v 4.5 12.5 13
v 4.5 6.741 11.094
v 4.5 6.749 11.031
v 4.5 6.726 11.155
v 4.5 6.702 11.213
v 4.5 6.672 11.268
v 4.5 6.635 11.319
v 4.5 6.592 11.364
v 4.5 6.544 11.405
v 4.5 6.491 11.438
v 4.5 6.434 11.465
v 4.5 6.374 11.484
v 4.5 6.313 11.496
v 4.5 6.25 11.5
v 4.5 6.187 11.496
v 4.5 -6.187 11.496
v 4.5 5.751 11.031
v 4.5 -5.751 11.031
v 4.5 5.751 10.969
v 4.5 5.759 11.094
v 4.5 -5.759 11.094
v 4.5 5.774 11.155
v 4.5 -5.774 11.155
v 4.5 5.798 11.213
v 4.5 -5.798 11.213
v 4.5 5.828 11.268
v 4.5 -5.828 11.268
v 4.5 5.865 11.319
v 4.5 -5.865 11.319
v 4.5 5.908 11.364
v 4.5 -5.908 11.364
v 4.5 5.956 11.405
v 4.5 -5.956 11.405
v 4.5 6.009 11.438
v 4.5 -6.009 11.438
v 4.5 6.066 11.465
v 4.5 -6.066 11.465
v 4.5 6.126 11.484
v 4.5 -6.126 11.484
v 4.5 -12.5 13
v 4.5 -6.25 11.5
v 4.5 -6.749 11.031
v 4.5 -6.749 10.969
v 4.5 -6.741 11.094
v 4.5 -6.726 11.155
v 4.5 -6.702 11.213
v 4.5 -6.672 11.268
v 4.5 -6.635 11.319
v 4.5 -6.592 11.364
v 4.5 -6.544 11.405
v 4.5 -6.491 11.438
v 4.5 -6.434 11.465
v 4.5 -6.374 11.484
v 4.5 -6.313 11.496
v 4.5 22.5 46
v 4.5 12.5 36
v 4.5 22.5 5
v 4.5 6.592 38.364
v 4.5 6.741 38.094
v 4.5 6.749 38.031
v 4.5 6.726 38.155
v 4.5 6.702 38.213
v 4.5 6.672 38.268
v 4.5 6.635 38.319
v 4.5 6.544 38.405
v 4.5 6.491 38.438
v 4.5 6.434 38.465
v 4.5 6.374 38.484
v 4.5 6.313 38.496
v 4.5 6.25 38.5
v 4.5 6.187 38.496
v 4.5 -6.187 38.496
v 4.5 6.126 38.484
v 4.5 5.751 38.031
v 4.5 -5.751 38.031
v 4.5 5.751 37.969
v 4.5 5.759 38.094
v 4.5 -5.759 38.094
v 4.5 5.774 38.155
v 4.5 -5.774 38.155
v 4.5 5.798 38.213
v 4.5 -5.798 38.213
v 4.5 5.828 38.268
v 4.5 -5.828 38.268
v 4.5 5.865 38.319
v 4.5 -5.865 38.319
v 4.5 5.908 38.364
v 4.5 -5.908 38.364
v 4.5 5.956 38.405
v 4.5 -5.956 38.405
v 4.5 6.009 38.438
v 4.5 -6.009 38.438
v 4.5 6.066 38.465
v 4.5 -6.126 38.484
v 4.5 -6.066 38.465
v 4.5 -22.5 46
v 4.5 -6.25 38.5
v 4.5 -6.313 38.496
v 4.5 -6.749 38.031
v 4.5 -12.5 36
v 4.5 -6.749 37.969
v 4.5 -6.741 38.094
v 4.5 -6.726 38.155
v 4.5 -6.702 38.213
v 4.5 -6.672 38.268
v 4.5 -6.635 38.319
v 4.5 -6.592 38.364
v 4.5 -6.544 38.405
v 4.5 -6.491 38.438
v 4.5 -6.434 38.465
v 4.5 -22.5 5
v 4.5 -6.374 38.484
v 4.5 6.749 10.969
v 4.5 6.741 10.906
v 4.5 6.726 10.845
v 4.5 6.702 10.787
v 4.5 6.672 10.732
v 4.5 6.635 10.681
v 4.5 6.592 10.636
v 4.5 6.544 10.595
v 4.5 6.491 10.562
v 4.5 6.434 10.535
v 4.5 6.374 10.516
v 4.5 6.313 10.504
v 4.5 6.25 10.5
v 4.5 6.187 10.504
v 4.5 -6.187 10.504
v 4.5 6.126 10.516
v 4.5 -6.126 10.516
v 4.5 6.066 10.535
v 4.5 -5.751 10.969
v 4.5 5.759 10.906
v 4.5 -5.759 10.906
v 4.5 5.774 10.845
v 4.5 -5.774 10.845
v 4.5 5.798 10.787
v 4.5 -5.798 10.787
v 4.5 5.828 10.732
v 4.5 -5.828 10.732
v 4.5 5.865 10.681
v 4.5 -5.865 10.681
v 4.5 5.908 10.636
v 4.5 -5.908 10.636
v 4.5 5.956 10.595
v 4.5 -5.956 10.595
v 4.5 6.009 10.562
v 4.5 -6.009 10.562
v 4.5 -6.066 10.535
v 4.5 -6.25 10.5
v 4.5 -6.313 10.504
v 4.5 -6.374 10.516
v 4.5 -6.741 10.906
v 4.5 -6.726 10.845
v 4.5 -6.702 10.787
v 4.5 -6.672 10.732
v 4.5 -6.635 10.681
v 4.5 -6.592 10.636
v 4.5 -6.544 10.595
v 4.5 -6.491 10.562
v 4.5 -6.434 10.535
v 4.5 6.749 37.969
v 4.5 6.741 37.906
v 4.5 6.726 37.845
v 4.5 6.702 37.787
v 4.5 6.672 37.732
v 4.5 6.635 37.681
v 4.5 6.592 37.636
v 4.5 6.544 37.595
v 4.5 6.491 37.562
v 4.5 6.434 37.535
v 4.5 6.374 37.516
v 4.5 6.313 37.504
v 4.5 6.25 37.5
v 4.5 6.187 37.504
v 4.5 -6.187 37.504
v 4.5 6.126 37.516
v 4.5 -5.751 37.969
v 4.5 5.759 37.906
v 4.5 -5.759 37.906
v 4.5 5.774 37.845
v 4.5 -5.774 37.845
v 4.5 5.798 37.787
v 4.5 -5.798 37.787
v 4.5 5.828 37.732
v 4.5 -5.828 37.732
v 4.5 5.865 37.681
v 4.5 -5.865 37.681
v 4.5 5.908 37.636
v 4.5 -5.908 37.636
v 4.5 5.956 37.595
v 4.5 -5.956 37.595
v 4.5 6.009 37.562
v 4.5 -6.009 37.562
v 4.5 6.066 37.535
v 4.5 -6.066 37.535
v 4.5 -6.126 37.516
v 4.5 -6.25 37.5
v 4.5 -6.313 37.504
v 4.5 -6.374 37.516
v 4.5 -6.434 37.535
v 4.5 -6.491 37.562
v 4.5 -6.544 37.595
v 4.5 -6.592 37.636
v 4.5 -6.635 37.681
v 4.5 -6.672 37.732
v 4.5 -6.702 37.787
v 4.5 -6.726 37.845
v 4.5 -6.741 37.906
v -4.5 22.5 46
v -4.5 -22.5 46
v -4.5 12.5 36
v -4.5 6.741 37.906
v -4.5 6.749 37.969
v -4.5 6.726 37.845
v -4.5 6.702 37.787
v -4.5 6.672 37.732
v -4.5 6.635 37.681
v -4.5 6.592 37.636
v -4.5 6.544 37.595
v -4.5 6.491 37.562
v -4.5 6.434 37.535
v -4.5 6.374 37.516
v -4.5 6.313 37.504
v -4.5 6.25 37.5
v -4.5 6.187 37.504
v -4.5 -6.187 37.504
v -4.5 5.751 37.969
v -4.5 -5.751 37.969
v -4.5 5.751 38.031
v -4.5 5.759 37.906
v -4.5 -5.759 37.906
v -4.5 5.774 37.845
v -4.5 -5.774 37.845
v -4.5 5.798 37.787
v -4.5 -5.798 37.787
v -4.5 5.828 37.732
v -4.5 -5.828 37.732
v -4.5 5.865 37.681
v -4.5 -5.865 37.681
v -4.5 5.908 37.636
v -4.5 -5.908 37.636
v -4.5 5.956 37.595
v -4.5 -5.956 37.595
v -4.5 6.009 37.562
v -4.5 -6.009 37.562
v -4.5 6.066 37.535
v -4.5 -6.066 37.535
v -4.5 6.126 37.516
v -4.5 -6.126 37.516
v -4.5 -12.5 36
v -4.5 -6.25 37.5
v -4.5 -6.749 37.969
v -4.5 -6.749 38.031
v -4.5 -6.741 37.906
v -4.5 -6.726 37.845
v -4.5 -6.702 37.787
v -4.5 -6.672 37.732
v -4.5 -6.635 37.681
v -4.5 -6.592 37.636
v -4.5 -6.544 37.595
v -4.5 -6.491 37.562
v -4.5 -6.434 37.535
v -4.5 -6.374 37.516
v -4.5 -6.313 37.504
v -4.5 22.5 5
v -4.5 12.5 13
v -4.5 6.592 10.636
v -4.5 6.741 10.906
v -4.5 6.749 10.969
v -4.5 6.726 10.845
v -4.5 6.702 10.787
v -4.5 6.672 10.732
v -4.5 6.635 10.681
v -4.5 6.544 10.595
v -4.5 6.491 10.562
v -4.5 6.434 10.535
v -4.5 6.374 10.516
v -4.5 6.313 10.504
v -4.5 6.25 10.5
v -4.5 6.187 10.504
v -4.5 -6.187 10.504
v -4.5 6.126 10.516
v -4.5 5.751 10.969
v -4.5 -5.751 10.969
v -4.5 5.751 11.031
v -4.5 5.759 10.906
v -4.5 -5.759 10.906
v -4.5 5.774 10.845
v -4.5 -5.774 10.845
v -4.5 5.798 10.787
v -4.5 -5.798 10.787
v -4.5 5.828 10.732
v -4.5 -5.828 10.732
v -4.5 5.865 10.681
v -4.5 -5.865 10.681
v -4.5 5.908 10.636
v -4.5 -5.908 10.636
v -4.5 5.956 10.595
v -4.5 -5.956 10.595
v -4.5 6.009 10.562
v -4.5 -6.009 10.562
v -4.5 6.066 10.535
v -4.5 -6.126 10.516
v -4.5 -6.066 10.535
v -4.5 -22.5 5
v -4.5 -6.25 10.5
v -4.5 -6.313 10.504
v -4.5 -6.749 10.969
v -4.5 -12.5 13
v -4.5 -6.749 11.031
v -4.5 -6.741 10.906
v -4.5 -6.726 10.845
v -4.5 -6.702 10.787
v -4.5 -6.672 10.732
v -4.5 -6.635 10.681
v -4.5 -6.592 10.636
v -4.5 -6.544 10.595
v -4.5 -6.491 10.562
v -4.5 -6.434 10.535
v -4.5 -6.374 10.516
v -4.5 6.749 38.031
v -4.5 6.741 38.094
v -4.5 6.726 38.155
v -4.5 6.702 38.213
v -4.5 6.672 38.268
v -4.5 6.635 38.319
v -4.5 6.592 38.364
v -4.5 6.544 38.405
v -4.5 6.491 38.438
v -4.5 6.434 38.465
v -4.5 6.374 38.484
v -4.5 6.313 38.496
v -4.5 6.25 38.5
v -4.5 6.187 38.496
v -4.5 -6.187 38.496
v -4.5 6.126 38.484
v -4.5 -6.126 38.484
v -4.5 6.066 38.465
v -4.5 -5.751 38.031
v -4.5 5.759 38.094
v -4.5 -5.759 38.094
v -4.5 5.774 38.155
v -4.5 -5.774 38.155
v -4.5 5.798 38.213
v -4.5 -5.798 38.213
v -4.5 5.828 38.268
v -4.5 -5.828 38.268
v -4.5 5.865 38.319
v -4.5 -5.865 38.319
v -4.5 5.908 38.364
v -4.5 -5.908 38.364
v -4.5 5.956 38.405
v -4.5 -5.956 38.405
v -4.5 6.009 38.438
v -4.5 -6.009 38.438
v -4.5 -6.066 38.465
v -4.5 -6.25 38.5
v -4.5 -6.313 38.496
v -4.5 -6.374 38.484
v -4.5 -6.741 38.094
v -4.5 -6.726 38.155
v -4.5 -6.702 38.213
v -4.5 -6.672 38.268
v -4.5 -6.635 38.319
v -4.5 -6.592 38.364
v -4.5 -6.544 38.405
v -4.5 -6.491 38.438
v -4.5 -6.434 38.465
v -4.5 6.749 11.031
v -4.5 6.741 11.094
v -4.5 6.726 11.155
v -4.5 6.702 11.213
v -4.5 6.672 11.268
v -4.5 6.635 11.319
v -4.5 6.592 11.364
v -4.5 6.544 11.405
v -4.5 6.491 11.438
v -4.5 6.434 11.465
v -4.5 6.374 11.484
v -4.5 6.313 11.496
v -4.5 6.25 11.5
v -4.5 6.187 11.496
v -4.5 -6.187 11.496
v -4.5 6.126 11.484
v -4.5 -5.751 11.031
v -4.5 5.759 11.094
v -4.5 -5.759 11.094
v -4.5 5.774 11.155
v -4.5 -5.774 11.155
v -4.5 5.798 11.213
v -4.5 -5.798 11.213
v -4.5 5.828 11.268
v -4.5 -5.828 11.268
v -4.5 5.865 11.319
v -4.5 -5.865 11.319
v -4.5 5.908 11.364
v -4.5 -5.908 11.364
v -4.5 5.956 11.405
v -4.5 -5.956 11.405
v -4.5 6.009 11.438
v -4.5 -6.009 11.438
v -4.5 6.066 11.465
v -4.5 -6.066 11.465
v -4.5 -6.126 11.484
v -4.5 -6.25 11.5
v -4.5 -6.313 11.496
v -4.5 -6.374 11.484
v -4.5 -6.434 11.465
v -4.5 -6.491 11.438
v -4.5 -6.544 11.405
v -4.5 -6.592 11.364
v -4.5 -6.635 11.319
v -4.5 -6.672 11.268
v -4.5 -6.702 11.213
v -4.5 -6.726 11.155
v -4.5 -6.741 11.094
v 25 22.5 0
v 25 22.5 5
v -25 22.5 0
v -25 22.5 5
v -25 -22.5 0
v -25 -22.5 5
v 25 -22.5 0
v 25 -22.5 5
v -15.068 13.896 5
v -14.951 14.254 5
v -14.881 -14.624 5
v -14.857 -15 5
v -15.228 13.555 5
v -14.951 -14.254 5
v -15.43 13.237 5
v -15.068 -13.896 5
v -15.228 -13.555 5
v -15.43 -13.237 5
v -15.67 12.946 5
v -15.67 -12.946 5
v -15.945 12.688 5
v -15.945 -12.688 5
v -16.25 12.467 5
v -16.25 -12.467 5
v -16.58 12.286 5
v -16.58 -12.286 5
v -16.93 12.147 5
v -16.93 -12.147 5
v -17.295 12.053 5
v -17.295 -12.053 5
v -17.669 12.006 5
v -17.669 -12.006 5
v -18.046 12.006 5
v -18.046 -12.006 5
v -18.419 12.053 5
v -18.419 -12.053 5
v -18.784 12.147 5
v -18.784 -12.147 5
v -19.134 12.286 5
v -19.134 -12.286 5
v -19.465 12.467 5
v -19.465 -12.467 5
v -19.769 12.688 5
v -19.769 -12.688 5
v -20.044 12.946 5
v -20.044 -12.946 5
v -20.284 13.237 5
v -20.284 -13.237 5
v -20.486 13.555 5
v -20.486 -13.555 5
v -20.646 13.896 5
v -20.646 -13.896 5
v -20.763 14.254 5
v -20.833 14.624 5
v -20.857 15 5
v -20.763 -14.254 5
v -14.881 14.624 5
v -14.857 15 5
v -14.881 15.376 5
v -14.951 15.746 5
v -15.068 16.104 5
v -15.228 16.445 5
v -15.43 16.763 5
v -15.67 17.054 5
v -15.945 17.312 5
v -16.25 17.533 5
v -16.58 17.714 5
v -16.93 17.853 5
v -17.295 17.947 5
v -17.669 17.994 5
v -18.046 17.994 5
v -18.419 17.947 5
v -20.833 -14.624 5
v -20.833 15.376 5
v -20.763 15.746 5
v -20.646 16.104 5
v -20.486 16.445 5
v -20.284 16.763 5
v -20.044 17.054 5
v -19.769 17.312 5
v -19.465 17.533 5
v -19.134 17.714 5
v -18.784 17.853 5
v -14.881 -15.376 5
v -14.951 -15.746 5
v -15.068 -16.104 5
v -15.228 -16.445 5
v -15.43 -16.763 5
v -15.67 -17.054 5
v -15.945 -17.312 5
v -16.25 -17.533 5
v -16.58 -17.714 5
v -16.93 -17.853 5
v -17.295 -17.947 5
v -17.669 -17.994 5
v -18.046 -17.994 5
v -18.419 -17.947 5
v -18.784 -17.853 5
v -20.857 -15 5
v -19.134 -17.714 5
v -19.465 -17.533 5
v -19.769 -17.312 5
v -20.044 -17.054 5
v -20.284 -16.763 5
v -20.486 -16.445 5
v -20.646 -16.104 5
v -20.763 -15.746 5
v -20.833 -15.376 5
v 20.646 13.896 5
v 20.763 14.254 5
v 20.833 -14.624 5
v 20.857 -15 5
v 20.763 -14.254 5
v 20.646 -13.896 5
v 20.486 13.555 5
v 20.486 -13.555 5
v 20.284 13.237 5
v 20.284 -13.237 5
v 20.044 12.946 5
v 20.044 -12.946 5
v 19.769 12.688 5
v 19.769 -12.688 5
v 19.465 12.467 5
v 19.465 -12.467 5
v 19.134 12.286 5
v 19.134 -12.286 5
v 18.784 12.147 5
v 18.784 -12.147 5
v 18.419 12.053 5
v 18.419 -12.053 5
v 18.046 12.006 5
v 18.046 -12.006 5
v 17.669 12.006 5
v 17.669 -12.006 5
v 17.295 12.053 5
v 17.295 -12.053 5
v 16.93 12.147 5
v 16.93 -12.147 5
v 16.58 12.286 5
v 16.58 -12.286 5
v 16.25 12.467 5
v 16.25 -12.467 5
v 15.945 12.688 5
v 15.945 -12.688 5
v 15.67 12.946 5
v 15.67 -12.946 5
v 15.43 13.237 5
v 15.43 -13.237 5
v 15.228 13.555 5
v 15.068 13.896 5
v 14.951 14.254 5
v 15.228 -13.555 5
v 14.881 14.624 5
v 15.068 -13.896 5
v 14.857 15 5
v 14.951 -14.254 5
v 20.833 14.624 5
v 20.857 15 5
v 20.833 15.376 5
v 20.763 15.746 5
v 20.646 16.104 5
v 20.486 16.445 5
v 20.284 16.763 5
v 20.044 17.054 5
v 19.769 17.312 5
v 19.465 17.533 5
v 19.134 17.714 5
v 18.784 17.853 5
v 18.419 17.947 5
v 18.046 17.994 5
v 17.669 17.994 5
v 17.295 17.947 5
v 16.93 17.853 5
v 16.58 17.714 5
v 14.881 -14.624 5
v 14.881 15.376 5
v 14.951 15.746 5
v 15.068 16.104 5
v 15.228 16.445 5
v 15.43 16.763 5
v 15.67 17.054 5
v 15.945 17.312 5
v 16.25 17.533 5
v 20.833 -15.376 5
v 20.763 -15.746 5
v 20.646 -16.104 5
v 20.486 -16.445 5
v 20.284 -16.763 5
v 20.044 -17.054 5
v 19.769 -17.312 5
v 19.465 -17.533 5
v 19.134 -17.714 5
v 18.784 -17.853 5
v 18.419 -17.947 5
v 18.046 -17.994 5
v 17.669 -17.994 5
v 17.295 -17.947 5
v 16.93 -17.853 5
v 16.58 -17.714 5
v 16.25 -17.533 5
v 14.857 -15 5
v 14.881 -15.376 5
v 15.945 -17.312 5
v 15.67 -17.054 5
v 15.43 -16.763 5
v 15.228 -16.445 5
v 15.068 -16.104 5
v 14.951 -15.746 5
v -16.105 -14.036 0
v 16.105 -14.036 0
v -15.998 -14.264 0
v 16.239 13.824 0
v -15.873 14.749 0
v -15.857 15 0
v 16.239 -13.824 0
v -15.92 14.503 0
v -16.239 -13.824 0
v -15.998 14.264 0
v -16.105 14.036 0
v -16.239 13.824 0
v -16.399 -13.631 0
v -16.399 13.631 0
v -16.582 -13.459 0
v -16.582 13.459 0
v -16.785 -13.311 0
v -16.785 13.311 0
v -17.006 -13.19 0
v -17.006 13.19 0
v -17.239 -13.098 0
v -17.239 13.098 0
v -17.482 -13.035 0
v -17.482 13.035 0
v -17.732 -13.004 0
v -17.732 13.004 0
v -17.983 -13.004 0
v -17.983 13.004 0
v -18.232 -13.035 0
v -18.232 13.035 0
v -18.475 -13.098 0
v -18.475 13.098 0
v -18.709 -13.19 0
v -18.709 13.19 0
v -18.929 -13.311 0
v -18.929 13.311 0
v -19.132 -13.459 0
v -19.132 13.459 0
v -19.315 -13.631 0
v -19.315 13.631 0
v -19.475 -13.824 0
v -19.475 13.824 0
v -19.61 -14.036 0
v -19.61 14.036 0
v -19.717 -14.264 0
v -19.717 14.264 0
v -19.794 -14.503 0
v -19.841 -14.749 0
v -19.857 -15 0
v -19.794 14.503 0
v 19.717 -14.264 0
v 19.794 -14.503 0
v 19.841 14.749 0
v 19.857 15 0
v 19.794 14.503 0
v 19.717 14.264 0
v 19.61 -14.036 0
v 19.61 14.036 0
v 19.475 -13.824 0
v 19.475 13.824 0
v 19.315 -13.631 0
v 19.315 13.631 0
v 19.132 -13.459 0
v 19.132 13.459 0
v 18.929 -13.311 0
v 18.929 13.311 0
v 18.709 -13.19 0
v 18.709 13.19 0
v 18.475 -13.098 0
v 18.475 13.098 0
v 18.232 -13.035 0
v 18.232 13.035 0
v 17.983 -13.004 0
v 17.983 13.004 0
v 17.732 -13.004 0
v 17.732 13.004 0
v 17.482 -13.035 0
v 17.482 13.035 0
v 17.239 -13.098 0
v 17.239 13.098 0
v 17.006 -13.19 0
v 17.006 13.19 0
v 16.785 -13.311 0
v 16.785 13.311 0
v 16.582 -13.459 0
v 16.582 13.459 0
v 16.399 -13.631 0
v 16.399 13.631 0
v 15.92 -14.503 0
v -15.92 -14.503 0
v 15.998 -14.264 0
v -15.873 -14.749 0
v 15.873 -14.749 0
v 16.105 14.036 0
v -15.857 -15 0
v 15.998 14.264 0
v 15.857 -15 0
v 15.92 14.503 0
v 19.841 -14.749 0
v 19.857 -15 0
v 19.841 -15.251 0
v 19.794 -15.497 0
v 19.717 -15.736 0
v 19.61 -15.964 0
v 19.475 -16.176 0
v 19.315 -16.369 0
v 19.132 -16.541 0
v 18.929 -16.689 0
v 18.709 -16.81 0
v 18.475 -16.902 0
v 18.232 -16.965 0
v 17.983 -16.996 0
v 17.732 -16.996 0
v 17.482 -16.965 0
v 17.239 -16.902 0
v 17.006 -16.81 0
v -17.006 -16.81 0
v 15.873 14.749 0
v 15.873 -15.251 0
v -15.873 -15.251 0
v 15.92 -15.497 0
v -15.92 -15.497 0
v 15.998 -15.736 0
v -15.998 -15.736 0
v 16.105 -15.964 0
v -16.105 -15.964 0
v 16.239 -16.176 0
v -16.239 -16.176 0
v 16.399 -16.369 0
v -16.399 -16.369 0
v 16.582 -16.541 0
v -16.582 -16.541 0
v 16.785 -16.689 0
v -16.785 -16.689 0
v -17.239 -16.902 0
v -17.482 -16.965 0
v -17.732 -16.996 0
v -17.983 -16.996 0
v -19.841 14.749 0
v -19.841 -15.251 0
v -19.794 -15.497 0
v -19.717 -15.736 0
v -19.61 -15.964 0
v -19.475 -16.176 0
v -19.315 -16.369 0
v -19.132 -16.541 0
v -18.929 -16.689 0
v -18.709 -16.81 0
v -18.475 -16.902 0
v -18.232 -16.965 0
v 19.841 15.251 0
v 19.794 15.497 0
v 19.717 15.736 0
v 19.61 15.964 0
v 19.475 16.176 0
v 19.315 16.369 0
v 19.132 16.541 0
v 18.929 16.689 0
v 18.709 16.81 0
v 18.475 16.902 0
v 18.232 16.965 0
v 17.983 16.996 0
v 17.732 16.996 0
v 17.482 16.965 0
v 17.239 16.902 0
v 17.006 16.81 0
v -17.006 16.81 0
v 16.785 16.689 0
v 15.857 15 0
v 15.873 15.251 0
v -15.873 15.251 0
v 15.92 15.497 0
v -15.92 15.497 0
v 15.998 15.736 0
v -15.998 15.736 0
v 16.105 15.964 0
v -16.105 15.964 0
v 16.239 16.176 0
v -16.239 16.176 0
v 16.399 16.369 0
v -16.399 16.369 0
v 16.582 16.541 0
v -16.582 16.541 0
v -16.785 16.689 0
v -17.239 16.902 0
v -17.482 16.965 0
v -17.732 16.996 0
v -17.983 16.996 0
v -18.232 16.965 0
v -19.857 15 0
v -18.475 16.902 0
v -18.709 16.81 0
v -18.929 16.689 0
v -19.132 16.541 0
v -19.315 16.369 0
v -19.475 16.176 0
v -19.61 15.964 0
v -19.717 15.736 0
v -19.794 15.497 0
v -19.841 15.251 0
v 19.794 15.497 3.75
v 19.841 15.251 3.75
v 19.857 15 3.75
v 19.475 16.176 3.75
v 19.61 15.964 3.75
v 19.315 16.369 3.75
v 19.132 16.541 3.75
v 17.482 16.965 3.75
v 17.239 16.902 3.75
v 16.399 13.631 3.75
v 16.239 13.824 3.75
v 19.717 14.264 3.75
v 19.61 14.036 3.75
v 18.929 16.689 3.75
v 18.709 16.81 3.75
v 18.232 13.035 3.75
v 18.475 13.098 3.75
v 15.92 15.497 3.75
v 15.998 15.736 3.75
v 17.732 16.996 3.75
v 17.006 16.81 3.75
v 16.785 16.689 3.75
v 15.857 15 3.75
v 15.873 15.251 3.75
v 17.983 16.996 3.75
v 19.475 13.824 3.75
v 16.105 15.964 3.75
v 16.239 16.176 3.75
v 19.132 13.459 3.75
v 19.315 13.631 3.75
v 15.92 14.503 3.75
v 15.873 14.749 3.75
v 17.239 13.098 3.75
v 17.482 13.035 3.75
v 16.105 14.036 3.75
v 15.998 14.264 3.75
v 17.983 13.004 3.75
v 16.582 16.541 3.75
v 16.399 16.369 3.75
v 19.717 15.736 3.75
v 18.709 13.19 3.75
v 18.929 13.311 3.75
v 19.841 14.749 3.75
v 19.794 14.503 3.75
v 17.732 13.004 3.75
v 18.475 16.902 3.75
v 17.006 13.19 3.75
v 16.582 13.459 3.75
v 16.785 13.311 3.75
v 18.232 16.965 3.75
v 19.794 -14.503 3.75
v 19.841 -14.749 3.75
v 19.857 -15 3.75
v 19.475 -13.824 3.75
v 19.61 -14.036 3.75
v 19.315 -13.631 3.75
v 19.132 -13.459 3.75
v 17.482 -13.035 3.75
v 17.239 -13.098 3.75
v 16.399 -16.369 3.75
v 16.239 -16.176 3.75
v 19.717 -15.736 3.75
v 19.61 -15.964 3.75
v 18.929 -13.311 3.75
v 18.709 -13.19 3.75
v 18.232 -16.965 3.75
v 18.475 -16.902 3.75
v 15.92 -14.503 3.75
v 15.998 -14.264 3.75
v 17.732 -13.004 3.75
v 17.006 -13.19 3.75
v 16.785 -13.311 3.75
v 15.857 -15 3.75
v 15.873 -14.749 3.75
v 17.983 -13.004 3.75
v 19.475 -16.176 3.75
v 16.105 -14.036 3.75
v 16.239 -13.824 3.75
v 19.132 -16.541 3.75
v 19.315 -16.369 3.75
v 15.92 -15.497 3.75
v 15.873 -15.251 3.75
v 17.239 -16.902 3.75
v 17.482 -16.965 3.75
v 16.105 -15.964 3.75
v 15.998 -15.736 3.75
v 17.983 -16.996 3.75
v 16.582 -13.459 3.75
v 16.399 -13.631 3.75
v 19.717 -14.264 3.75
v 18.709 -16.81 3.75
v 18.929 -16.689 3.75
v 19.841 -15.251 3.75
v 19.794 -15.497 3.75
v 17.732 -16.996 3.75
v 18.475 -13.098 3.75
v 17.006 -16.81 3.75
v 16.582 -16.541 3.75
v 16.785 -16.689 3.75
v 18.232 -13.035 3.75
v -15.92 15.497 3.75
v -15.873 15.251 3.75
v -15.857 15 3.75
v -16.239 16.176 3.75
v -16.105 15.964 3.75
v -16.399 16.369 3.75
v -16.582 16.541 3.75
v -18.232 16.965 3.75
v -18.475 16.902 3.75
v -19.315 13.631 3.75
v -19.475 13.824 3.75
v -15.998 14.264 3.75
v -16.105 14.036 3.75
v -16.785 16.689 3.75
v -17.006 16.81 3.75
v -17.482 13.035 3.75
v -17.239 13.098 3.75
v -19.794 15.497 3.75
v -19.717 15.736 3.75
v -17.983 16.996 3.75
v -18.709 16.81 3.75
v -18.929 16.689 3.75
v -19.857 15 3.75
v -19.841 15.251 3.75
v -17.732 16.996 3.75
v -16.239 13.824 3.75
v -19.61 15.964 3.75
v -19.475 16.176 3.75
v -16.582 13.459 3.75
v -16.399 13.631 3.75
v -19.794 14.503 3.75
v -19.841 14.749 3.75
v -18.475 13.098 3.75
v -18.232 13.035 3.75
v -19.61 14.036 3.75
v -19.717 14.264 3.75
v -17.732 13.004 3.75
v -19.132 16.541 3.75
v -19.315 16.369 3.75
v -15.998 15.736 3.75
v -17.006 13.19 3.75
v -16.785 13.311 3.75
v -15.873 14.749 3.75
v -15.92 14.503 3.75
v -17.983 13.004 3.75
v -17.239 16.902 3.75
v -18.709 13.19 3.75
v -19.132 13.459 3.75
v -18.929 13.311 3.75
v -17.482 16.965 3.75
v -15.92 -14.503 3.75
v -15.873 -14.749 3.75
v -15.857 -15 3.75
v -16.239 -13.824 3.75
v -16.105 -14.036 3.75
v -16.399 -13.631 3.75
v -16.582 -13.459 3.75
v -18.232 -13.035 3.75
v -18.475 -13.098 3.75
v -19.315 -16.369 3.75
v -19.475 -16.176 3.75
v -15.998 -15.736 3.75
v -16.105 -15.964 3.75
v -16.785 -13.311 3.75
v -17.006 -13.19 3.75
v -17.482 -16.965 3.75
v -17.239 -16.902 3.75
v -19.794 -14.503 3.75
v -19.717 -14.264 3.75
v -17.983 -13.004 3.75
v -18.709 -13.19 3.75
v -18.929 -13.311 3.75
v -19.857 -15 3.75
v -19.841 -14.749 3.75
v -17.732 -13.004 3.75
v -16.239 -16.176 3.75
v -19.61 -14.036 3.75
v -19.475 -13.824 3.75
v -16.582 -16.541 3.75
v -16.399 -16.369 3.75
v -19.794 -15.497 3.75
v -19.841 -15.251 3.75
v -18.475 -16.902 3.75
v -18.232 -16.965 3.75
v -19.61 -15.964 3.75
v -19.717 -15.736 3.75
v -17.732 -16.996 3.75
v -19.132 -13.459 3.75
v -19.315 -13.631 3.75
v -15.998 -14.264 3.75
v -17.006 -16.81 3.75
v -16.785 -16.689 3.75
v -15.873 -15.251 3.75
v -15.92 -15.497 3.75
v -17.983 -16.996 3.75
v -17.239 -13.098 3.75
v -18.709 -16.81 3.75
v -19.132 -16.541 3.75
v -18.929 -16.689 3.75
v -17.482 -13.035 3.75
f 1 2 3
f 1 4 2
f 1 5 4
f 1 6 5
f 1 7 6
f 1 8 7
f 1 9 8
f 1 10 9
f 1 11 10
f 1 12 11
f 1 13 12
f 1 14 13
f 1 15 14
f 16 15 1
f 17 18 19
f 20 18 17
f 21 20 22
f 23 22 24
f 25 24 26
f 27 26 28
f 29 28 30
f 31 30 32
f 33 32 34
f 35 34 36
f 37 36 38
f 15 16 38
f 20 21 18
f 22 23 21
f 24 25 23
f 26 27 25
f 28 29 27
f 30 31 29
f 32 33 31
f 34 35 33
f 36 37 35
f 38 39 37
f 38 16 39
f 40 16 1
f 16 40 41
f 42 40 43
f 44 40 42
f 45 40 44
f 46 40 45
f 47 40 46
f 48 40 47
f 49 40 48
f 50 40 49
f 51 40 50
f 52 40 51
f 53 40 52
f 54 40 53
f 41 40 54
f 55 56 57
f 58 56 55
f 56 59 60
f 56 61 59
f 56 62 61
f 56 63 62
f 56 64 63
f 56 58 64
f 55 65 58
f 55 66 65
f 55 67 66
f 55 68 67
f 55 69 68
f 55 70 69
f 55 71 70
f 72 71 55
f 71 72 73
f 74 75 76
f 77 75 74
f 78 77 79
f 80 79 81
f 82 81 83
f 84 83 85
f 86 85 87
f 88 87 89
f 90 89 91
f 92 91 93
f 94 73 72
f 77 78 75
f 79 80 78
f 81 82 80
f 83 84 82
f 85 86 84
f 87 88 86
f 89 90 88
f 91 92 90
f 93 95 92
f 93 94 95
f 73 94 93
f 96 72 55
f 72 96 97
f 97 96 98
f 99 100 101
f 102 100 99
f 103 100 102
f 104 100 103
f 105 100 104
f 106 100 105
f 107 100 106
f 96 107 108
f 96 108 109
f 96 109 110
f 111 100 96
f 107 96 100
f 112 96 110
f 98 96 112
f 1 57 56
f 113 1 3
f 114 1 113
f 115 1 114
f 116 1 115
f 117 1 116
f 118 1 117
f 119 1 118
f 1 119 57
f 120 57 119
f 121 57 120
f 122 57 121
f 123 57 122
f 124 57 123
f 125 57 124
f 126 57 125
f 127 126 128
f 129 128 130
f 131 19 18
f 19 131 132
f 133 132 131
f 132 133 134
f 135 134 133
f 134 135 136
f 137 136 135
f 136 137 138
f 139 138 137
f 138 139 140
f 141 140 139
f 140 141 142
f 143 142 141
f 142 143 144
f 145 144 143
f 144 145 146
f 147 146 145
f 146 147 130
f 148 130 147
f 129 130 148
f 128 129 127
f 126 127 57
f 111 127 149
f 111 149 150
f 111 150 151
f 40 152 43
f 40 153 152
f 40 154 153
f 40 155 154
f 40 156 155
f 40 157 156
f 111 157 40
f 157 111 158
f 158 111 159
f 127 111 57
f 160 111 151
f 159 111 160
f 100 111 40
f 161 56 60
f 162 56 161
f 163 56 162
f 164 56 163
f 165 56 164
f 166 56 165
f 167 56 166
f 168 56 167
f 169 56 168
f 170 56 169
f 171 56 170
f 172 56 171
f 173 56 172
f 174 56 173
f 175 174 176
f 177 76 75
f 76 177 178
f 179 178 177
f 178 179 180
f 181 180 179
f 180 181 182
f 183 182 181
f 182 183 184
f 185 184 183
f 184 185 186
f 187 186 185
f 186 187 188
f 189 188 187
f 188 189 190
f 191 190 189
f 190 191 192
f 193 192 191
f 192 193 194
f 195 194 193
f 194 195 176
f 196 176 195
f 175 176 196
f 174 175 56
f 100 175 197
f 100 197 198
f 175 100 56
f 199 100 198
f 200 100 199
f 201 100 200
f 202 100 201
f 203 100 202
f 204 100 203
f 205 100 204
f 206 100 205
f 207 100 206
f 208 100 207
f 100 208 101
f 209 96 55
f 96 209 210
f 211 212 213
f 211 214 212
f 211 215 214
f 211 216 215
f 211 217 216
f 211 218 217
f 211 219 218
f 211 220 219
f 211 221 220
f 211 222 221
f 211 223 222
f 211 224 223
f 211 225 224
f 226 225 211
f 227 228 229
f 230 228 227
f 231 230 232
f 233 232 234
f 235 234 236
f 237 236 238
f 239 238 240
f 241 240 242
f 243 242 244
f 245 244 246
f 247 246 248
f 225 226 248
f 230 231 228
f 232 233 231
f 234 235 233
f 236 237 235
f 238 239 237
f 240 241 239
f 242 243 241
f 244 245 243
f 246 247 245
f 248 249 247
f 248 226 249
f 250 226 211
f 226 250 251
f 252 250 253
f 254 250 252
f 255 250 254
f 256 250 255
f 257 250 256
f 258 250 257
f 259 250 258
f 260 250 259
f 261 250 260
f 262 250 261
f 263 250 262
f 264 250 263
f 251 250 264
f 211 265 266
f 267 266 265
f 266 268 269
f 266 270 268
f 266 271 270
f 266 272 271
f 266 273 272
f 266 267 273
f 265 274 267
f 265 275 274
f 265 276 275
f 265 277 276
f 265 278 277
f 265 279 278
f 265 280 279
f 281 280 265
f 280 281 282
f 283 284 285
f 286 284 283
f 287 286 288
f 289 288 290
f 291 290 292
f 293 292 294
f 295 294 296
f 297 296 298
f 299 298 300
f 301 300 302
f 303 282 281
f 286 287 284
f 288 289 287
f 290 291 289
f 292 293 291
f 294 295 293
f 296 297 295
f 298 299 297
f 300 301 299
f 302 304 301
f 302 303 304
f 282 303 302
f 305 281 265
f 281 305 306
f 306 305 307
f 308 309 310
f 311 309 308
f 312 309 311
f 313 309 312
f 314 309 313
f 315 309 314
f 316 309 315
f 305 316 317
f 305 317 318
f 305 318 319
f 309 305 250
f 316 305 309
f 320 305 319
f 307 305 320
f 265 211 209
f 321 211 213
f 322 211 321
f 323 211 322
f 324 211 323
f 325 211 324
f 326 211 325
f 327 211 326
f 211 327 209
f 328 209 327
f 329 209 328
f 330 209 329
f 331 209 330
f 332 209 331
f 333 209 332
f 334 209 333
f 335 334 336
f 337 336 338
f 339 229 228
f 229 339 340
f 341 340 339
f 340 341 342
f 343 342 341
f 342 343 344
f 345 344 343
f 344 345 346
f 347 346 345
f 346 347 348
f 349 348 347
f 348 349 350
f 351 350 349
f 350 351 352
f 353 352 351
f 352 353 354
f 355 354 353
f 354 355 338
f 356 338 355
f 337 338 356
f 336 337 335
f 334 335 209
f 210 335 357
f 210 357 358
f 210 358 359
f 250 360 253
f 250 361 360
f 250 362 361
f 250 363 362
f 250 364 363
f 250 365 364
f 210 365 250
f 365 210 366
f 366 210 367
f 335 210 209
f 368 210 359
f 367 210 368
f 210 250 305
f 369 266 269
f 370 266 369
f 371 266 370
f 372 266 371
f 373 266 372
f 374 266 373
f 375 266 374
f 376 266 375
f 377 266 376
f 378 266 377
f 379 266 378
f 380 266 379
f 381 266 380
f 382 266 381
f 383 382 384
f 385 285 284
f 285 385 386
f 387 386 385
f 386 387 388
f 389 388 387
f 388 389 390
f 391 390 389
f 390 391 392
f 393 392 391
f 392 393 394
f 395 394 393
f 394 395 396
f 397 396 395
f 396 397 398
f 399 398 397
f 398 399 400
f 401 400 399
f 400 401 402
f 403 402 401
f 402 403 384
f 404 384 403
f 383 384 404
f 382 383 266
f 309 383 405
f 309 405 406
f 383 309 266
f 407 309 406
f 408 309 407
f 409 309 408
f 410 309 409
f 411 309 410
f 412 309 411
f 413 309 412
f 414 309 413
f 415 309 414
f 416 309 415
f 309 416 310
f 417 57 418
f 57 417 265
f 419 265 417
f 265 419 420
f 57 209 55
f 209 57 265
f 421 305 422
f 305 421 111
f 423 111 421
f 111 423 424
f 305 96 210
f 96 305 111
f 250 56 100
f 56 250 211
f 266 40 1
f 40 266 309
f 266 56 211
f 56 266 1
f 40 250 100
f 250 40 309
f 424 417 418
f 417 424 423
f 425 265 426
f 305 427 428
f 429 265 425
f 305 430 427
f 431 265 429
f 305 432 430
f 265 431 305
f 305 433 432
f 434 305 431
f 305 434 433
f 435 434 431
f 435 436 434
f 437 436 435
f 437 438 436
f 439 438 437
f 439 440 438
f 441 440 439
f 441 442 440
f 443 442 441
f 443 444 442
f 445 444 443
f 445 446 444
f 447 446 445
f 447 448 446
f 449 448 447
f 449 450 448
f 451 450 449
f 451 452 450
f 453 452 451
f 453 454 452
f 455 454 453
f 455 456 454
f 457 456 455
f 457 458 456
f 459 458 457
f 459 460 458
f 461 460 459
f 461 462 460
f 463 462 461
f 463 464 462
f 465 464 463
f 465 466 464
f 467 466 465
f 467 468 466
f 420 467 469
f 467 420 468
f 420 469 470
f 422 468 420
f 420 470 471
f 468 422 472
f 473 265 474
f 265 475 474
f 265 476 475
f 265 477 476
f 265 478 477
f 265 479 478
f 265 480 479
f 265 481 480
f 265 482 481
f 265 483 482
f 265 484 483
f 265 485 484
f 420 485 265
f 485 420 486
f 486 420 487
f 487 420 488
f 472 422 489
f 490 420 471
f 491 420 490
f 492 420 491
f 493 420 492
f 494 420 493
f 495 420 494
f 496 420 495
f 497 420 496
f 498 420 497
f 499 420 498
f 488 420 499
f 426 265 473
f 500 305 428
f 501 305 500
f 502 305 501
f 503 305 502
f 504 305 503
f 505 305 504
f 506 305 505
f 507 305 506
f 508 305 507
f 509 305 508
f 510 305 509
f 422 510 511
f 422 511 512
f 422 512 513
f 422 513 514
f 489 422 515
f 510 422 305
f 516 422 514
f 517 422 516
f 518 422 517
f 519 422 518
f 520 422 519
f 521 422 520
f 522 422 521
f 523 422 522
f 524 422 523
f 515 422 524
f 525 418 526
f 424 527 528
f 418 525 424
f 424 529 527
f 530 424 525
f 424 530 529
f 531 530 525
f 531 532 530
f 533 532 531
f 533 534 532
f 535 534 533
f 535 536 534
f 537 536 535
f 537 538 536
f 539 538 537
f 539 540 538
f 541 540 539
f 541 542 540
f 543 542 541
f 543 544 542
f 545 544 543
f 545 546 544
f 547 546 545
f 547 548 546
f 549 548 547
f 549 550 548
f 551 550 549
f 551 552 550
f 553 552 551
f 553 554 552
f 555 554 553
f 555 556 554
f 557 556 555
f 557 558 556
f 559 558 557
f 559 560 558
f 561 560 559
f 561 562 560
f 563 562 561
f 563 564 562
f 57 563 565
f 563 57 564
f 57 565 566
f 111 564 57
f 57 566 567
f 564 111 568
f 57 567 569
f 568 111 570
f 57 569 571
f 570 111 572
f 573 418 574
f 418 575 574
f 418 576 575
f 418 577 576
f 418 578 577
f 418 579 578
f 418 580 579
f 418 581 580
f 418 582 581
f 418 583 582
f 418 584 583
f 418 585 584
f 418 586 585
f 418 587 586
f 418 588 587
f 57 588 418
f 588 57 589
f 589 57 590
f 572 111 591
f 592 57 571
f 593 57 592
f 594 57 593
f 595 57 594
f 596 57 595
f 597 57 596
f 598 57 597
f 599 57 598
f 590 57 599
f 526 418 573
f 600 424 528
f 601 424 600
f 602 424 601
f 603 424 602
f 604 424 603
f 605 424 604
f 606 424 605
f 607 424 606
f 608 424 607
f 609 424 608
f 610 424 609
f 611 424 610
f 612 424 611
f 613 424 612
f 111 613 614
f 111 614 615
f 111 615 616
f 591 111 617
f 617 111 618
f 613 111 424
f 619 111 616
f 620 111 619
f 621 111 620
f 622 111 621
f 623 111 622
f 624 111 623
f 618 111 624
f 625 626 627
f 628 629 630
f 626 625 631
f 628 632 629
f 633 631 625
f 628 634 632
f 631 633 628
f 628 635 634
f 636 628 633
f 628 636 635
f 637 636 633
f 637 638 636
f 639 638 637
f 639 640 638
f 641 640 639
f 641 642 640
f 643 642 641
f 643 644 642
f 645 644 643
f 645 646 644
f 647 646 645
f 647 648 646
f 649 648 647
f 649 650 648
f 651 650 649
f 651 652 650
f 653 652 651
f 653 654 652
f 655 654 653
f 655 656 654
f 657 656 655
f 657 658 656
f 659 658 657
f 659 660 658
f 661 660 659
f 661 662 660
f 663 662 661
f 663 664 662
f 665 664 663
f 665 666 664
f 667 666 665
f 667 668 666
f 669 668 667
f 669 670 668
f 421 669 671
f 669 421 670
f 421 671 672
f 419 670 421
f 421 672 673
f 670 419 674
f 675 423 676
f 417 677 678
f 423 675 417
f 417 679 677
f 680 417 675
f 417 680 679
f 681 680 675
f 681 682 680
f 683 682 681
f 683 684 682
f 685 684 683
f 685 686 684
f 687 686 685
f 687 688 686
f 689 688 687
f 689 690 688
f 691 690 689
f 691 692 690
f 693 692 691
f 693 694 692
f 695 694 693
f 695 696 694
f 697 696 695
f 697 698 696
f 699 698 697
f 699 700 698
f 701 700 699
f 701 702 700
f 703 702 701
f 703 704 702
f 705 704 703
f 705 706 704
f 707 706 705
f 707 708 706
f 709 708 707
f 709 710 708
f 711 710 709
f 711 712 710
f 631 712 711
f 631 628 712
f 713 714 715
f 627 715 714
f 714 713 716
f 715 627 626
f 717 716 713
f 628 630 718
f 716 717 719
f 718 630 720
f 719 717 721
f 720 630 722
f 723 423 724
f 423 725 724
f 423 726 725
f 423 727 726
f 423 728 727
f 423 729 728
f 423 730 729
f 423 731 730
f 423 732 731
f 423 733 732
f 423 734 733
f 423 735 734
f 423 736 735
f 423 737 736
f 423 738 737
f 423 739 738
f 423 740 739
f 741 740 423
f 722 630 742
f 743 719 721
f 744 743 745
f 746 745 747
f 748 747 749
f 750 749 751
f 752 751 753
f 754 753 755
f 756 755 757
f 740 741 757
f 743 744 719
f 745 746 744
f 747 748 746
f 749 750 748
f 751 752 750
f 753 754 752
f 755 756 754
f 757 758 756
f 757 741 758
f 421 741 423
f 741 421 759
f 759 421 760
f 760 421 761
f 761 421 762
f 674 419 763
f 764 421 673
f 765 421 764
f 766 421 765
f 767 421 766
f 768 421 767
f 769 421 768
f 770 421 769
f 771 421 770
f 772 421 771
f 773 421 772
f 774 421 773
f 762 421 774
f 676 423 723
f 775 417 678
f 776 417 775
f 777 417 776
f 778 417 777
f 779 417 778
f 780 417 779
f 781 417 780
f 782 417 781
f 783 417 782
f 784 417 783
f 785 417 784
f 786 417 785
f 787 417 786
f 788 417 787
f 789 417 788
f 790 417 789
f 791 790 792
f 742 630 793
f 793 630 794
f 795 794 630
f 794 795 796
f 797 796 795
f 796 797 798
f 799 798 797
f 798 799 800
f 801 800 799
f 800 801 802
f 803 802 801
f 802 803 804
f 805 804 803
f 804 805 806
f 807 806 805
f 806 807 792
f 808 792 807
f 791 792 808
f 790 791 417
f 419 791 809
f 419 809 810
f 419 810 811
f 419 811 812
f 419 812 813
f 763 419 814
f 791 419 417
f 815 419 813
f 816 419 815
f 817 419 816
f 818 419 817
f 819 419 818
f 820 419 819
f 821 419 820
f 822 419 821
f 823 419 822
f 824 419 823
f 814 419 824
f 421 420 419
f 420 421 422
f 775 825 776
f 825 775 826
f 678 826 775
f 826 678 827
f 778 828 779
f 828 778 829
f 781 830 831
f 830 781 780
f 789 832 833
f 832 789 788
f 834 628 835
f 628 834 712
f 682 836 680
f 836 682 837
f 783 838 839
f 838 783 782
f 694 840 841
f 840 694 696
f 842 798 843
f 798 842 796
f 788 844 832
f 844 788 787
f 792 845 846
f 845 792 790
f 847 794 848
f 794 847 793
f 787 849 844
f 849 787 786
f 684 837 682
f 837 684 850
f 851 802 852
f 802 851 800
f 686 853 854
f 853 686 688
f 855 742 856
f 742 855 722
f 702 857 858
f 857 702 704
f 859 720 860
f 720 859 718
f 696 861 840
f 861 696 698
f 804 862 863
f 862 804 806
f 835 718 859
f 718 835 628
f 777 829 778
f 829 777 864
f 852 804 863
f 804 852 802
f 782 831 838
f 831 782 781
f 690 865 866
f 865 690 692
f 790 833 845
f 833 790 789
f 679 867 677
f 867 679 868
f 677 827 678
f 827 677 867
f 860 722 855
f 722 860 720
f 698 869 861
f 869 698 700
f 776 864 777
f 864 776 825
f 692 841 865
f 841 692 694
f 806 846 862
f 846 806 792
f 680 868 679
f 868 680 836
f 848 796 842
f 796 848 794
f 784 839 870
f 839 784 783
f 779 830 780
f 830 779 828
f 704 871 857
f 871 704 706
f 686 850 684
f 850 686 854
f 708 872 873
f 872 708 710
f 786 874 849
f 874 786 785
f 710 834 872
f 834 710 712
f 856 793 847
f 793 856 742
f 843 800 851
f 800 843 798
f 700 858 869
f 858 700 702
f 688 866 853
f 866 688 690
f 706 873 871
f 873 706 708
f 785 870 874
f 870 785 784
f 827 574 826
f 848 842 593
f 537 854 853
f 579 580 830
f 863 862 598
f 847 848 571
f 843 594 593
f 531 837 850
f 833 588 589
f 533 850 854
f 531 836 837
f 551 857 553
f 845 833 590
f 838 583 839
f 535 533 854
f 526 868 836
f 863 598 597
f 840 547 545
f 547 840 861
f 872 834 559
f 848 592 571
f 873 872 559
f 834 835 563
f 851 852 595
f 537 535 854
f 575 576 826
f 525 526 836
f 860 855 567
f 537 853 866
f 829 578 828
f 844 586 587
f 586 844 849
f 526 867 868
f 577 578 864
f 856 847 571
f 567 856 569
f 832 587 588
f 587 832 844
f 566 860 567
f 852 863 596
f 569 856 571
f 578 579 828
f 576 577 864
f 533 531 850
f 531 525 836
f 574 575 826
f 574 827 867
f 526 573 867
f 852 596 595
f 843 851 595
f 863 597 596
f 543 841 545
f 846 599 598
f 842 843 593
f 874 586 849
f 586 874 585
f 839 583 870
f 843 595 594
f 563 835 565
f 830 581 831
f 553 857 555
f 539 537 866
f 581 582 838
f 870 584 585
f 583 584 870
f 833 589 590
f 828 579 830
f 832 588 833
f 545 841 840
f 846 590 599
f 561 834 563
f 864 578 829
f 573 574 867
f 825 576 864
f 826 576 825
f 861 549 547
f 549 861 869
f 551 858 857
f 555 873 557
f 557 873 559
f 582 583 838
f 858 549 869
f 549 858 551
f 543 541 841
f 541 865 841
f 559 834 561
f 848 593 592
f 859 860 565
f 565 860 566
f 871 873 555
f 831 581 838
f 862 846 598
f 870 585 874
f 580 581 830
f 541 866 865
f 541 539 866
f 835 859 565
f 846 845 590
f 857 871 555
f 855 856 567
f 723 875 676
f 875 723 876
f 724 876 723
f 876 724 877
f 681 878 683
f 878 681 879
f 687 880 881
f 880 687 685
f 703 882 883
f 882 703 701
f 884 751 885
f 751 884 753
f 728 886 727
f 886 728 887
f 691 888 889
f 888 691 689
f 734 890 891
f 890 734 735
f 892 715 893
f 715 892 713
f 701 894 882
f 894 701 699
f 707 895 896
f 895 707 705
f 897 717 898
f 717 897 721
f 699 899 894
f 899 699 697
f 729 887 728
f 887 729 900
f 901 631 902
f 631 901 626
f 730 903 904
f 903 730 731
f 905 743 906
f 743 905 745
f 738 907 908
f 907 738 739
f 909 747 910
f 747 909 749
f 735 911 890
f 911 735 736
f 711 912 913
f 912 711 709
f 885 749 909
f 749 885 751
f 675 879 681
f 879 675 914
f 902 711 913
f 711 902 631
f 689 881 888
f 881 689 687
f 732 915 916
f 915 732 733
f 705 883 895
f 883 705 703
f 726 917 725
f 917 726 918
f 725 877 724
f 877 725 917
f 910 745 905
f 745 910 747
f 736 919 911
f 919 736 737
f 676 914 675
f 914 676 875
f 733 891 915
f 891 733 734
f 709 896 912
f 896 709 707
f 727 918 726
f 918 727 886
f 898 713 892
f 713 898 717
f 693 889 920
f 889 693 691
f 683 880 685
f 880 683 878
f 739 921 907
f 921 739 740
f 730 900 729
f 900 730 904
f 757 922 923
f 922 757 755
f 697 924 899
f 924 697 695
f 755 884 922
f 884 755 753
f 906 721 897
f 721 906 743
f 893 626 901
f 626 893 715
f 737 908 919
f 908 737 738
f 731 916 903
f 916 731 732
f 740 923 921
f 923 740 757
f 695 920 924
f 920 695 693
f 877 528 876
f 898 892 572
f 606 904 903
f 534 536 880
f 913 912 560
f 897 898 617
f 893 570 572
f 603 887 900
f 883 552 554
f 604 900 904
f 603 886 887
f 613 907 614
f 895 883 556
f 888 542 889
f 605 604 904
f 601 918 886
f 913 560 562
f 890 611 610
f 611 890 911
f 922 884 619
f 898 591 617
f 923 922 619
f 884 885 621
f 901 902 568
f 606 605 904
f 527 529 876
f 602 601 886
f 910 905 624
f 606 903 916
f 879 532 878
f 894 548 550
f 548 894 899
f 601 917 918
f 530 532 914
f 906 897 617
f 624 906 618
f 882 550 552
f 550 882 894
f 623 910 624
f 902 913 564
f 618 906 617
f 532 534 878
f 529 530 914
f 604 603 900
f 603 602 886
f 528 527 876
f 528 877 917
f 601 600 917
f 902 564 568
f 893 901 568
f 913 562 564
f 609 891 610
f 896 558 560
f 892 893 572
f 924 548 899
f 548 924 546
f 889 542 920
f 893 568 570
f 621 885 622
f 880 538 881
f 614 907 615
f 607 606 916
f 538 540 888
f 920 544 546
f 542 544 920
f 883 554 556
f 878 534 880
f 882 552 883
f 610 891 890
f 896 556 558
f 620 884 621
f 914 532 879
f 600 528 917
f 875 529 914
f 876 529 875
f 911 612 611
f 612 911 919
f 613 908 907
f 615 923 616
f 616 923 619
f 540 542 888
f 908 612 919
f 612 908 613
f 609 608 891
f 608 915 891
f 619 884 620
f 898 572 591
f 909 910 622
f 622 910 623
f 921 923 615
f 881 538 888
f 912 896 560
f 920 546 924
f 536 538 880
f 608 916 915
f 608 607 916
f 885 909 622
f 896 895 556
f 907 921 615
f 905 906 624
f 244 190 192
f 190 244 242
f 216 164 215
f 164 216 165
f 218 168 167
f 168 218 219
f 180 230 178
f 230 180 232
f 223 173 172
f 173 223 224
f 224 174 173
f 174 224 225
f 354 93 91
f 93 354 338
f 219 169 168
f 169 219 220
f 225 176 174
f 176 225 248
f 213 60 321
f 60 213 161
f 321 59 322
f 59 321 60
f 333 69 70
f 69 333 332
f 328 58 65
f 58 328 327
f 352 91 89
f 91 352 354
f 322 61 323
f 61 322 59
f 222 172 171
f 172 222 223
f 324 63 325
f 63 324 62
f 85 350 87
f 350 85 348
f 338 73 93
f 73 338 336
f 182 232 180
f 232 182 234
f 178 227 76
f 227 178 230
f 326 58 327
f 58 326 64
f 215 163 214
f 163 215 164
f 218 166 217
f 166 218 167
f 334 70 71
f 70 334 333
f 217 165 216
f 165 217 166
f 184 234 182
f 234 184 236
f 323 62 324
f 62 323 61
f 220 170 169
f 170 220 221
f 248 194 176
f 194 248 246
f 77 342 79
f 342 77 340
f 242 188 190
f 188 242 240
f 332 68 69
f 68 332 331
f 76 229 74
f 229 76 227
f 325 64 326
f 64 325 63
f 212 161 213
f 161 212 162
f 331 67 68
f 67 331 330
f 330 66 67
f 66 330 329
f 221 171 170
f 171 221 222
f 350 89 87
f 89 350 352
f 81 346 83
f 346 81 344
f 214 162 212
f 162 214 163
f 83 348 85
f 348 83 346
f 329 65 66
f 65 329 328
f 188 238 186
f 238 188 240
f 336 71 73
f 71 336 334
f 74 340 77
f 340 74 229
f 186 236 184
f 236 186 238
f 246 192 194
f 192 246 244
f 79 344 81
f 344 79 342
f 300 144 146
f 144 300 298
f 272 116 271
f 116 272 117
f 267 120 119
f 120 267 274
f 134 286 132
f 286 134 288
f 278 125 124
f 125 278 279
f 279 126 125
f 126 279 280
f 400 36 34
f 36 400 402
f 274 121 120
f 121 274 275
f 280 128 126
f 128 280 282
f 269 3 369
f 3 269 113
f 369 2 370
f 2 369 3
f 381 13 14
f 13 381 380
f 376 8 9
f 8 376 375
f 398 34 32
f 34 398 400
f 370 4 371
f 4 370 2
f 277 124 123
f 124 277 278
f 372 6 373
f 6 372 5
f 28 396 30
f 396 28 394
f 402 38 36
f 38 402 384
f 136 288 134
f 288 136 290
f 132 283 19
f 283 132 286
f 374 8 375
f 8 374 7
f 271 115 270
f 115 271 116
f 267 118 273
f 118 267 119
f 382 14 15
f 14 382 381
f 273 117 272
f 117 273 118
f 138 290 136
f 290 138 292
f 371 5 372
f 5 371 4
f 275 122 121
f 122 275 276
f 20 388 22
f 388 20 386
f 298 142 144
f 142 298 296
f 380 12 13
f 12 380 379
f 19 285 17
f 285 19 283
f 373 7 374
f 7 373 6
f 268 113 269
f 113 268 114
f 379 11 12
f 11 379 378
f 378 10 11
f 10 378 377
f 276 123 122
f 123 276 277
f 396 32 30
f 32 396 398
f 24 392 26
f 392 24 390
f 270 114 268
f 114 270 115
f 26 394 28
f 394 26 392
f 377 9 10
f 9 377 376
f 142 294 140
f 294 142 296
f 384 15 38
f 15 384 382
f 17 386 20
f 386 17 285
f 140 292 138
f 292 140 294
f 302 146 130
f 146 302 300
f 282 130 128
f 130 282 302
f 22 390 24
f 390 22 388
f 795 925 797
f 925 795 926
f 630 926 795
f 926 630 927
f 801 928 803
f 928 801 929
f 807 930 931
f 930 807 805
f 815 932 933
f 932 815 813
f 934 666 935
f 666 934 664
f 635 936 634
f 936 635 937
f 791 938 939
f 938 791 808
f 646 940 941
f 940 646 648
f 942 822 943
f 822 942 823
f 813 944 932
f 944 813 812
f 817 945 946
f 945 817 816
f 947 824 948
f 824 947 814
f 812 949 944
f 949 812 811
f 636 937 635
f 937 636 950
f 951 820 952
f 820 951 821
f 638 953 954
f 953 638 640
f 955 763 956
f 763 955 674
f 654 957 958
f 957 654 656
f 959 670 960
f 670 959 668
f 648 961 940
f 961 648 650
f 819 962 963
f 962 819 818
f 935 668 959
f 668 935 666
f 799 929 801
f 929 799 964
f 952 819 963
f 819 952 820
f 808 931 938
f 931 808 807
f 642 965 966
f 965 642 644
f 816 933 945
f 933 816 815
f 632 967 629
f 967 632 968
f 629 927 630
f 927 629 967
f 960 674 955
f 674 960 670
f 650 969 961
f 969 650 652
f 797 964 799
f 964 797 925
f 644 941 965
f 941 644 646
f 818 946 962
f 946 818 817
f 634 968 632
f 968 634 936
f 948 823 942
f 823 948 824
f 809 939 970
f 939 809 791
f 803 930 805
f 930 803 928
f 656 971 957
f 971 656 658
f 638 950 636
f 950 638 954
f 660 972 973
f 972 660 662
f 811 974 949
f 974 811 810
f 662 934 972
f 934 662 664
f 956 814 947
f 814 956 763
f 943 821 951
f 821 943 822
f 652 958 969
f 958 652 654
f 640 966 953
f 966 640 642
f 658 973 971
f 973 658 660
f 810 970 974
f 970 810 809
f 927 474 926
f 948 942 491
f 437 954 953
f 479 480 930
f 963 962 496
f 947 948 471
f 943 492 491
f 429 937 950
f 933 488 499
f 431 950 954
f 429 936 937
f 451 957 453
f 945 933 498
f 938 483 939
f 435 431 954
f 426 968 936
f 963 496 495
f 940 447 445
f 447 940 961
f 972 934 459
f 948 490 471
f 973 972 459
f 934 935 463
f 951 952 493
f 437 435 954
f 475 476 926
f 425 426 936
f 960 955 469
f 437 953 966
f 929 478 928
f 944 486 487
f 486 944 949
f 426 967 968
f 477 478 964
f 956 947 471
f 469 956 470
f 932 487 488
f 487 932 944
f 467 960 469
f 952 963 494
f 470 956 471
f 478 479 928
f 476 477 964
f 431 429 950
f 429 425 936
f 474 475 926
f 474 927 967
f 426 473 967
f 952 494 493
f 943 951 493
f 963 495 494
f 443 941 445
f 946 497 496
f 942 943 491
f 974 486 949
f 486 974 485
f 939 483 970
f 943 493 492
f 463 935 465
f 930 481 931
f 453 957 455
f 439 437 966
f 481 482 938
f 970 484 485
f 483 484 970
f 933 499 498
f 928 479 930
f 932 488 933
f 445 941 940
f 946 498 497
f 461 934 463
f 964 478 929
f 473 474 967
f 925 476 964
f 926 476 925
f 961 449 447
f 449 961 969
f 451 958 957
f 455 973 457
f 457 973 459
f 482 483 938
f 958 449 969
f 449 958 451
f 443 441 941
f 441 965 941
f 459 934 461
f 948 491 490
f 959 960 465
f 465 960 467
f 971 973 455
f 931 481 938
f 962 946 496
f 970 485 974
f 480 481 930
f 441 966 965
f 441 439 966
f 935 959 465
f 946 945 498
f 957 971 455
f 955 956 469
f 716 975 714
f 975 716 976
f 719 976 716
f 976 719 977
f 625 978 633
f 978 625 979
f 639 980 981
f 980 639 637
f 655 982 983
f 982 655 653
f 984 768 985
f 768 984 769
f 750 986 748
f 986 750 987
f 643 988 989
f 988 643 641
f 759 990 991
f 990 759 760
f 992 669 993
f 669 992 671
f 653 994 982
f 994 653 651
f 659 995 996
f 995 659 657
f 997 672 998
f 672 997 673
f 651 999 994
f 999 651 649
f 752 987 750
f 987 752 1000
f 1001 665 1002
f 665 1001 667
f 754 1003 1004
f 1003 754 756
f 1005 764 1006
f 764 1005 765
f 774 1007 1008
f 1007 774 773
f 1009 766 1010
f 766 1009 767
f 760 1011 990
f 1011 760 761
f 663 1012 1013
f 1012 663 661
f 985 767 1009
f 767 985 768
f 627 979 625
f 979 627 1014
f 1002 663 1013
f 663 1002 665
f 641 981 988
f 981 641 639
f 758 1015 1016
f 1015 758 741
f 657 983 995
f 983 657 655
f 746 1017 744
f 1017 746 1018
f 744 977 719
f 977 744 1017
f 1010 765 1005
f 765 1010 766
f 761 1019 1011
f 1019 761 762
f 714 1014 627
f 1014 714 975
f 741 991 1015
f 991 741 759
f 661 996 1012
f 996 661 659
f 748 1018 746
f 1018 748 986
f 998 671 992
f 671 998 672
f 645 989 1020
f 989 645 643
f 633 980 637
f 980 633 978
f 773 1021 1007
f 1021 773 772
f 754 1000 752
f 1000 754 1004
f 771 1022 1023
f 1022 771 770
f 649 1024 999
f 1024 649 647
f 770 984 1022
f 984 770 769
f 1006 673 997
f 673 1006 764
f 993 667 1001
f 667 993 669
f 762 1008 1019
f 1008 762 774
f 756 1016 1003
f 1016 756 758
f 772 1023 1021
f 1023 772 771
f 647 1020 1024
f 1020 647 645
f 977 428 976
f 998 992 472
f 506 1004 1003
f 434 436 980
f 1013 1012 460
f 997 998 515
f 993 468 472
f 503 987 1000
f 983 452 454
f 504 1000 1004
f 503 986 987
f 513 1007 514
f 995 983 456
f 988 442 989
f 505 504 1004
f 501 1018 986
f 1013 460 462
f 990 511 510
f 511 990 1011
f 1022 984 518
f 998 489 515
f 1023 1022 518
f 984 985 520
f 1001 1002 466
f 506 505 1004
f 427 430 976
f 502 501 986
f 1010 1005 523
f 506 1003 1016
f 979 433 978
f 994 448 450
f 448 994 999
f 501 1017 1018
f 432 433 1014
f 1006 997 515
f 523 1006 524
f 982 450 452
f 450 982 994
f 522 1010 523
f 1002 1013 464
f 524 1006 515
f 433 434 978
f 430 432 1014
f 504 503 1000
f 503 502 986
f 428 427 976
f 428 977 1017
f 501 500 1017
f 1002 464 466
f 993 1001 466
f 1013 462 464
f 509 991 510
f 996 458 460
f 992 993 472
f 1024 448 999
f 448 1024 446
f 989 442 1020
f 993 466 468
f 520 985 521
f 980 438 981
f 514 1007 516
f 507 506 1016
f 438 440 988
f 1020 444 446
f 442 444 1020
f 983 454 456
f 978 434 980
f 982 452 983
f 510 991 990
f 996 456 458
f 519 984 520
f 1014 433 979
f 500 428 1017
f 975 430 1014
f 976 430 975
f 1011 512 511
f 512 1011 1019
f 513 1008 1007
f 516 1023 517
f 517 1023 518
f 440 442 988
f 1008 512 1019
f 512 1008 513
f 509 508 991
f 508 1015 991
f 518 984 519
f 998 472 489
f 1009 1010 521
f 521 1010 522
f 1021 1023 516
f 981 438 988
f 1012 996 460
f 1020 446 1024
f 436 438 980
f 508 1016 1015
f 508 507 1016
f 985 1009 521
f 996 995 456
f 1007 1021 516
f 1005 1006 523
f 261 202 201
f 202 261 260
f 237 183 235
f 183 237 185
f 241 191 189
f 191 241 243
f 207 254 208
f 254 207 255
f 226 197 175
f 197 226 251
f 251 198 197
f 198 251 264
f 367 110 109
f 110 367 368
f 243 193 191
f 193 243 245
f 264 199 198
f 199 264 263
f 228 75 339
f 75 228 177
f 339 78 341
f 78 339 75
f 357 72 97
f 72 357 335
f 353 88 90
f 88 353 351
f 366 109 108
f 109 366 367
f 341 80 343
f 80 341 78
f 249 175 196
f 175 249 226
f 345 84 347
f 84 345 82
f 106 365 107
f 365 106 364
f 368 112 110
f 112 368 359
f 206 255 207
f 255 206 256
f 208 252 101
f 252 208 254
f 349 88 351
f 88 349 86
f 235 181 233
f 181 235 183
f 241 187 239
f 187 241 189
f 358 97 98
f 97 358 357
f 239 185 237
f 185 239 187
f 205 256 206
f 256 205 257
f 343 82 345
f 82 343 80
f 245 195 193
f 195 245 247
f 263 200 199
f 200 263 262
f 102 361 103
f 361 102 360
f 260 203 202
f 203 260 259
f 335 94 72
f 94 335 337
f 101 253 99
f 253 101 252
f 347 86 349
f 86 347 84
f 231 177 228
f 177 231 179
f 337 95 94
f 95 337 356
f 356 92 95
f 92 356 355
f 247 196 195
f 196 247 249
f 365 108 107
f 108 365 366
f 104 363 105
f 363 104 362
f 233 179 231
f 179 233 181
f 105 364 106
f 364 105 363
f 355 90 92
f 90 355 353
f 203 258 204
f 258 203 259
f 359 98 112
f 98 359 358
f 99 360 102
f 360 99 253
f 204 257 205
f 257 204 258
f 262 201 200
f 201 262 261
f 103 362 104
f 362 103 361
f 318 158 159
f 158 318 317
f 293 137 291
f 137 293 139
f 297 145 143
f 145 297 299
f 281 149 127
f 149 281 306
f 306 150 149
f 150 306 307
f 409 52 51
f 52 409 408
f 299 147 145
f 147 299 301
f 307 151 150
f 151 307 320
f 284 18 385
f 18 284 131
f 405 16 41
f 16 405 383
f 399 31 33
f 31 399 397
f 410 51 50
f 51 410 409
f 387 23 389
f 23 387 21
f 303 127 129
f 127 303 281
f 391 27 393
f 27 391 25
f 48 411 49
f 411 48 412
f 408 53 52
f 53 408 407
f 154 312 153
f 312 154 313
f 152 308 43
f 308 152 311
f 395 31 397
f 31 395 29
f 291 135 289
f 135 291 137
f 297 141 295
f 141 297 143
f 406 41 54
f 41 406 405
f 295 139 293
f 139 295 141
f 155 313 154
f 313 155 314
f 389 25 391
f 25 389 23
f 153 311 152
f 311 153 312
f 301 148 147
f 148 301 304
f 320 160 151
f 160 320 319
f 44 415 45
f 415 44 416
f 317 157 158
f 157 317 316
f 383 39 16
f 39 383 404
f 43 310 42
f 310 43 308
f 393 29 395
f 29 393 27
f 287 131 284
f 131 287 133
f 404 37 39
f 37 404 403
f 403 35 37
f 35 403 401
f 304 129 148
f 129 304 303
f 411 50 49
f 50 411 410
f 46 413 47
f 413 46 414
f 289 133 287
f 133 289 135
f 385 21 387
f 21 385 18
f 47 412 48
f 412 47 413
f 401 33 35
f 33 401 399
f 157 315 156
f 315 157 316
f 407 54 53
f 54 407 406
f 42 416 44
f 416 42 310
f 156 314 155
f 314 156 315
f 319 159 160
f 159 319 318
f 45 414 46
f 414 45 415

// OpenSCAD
wall_width = 9;
servo_width = 12.5;
servo_height = 22.5 + 0.5;
screw_offset = 2;
screw_dia = 1;
mount_screw_dia = 4;
border = 10;
tab = 5;
tab_clearance = 3;

assembly_height = servo_height + border*2;
assembly_width = servo_width*2 + border*2;
mount_width = border - tab;
mount_length = border*5;

$fn = 50;

module housing() {
    difference() {
        cube(size=[wall_width, assembly_width, assembly_height]);
        translate([0, border, border])
        cube(size=[wall_width, servo_width*2, servo_height]);
    }
}

module assembly() {
    translate([0, assembly_width/-2, 0])
    union() {
        translate([wall_width/-2, 0, tab_clearance])
        housing();
        translate([mount_length/-2, 0, 0])
        cube([mount_length, assembly_width, mount_width]);
    }
}

module screw_hole() {
    translate([wall_width/-2, 0 ,0])
    rotate([0, 90, 0])
    cylinder(h=wall_width, d=screw_dia);
}

module mount_screw_hole() {
    cylinder(h=mount_width, d=mount_screw_dia);
    translate([0, 0, 3 * mount_width/4])
    cylinder(h=mount_width/4, d1=mount_screw_dia, d2=mount_screw_dia*1.5);
}

module finished_assembly() {
    difference() {
        assembly();
        for(x=[1, -1]) {
            for (y=[1, -1]) {
                translate([x * mount_length / 2.8, y * assembly_width / 3, 0])
                mount_screw_hole();
                
                translate([0, x * servo_width / 2, y * (servo_height / 2 + screw_offset)])
                translate([0, 0, tab_clearance + assembly_height/2])
                screw_hole();
            }
        }
    }
}

finished_assembly();
